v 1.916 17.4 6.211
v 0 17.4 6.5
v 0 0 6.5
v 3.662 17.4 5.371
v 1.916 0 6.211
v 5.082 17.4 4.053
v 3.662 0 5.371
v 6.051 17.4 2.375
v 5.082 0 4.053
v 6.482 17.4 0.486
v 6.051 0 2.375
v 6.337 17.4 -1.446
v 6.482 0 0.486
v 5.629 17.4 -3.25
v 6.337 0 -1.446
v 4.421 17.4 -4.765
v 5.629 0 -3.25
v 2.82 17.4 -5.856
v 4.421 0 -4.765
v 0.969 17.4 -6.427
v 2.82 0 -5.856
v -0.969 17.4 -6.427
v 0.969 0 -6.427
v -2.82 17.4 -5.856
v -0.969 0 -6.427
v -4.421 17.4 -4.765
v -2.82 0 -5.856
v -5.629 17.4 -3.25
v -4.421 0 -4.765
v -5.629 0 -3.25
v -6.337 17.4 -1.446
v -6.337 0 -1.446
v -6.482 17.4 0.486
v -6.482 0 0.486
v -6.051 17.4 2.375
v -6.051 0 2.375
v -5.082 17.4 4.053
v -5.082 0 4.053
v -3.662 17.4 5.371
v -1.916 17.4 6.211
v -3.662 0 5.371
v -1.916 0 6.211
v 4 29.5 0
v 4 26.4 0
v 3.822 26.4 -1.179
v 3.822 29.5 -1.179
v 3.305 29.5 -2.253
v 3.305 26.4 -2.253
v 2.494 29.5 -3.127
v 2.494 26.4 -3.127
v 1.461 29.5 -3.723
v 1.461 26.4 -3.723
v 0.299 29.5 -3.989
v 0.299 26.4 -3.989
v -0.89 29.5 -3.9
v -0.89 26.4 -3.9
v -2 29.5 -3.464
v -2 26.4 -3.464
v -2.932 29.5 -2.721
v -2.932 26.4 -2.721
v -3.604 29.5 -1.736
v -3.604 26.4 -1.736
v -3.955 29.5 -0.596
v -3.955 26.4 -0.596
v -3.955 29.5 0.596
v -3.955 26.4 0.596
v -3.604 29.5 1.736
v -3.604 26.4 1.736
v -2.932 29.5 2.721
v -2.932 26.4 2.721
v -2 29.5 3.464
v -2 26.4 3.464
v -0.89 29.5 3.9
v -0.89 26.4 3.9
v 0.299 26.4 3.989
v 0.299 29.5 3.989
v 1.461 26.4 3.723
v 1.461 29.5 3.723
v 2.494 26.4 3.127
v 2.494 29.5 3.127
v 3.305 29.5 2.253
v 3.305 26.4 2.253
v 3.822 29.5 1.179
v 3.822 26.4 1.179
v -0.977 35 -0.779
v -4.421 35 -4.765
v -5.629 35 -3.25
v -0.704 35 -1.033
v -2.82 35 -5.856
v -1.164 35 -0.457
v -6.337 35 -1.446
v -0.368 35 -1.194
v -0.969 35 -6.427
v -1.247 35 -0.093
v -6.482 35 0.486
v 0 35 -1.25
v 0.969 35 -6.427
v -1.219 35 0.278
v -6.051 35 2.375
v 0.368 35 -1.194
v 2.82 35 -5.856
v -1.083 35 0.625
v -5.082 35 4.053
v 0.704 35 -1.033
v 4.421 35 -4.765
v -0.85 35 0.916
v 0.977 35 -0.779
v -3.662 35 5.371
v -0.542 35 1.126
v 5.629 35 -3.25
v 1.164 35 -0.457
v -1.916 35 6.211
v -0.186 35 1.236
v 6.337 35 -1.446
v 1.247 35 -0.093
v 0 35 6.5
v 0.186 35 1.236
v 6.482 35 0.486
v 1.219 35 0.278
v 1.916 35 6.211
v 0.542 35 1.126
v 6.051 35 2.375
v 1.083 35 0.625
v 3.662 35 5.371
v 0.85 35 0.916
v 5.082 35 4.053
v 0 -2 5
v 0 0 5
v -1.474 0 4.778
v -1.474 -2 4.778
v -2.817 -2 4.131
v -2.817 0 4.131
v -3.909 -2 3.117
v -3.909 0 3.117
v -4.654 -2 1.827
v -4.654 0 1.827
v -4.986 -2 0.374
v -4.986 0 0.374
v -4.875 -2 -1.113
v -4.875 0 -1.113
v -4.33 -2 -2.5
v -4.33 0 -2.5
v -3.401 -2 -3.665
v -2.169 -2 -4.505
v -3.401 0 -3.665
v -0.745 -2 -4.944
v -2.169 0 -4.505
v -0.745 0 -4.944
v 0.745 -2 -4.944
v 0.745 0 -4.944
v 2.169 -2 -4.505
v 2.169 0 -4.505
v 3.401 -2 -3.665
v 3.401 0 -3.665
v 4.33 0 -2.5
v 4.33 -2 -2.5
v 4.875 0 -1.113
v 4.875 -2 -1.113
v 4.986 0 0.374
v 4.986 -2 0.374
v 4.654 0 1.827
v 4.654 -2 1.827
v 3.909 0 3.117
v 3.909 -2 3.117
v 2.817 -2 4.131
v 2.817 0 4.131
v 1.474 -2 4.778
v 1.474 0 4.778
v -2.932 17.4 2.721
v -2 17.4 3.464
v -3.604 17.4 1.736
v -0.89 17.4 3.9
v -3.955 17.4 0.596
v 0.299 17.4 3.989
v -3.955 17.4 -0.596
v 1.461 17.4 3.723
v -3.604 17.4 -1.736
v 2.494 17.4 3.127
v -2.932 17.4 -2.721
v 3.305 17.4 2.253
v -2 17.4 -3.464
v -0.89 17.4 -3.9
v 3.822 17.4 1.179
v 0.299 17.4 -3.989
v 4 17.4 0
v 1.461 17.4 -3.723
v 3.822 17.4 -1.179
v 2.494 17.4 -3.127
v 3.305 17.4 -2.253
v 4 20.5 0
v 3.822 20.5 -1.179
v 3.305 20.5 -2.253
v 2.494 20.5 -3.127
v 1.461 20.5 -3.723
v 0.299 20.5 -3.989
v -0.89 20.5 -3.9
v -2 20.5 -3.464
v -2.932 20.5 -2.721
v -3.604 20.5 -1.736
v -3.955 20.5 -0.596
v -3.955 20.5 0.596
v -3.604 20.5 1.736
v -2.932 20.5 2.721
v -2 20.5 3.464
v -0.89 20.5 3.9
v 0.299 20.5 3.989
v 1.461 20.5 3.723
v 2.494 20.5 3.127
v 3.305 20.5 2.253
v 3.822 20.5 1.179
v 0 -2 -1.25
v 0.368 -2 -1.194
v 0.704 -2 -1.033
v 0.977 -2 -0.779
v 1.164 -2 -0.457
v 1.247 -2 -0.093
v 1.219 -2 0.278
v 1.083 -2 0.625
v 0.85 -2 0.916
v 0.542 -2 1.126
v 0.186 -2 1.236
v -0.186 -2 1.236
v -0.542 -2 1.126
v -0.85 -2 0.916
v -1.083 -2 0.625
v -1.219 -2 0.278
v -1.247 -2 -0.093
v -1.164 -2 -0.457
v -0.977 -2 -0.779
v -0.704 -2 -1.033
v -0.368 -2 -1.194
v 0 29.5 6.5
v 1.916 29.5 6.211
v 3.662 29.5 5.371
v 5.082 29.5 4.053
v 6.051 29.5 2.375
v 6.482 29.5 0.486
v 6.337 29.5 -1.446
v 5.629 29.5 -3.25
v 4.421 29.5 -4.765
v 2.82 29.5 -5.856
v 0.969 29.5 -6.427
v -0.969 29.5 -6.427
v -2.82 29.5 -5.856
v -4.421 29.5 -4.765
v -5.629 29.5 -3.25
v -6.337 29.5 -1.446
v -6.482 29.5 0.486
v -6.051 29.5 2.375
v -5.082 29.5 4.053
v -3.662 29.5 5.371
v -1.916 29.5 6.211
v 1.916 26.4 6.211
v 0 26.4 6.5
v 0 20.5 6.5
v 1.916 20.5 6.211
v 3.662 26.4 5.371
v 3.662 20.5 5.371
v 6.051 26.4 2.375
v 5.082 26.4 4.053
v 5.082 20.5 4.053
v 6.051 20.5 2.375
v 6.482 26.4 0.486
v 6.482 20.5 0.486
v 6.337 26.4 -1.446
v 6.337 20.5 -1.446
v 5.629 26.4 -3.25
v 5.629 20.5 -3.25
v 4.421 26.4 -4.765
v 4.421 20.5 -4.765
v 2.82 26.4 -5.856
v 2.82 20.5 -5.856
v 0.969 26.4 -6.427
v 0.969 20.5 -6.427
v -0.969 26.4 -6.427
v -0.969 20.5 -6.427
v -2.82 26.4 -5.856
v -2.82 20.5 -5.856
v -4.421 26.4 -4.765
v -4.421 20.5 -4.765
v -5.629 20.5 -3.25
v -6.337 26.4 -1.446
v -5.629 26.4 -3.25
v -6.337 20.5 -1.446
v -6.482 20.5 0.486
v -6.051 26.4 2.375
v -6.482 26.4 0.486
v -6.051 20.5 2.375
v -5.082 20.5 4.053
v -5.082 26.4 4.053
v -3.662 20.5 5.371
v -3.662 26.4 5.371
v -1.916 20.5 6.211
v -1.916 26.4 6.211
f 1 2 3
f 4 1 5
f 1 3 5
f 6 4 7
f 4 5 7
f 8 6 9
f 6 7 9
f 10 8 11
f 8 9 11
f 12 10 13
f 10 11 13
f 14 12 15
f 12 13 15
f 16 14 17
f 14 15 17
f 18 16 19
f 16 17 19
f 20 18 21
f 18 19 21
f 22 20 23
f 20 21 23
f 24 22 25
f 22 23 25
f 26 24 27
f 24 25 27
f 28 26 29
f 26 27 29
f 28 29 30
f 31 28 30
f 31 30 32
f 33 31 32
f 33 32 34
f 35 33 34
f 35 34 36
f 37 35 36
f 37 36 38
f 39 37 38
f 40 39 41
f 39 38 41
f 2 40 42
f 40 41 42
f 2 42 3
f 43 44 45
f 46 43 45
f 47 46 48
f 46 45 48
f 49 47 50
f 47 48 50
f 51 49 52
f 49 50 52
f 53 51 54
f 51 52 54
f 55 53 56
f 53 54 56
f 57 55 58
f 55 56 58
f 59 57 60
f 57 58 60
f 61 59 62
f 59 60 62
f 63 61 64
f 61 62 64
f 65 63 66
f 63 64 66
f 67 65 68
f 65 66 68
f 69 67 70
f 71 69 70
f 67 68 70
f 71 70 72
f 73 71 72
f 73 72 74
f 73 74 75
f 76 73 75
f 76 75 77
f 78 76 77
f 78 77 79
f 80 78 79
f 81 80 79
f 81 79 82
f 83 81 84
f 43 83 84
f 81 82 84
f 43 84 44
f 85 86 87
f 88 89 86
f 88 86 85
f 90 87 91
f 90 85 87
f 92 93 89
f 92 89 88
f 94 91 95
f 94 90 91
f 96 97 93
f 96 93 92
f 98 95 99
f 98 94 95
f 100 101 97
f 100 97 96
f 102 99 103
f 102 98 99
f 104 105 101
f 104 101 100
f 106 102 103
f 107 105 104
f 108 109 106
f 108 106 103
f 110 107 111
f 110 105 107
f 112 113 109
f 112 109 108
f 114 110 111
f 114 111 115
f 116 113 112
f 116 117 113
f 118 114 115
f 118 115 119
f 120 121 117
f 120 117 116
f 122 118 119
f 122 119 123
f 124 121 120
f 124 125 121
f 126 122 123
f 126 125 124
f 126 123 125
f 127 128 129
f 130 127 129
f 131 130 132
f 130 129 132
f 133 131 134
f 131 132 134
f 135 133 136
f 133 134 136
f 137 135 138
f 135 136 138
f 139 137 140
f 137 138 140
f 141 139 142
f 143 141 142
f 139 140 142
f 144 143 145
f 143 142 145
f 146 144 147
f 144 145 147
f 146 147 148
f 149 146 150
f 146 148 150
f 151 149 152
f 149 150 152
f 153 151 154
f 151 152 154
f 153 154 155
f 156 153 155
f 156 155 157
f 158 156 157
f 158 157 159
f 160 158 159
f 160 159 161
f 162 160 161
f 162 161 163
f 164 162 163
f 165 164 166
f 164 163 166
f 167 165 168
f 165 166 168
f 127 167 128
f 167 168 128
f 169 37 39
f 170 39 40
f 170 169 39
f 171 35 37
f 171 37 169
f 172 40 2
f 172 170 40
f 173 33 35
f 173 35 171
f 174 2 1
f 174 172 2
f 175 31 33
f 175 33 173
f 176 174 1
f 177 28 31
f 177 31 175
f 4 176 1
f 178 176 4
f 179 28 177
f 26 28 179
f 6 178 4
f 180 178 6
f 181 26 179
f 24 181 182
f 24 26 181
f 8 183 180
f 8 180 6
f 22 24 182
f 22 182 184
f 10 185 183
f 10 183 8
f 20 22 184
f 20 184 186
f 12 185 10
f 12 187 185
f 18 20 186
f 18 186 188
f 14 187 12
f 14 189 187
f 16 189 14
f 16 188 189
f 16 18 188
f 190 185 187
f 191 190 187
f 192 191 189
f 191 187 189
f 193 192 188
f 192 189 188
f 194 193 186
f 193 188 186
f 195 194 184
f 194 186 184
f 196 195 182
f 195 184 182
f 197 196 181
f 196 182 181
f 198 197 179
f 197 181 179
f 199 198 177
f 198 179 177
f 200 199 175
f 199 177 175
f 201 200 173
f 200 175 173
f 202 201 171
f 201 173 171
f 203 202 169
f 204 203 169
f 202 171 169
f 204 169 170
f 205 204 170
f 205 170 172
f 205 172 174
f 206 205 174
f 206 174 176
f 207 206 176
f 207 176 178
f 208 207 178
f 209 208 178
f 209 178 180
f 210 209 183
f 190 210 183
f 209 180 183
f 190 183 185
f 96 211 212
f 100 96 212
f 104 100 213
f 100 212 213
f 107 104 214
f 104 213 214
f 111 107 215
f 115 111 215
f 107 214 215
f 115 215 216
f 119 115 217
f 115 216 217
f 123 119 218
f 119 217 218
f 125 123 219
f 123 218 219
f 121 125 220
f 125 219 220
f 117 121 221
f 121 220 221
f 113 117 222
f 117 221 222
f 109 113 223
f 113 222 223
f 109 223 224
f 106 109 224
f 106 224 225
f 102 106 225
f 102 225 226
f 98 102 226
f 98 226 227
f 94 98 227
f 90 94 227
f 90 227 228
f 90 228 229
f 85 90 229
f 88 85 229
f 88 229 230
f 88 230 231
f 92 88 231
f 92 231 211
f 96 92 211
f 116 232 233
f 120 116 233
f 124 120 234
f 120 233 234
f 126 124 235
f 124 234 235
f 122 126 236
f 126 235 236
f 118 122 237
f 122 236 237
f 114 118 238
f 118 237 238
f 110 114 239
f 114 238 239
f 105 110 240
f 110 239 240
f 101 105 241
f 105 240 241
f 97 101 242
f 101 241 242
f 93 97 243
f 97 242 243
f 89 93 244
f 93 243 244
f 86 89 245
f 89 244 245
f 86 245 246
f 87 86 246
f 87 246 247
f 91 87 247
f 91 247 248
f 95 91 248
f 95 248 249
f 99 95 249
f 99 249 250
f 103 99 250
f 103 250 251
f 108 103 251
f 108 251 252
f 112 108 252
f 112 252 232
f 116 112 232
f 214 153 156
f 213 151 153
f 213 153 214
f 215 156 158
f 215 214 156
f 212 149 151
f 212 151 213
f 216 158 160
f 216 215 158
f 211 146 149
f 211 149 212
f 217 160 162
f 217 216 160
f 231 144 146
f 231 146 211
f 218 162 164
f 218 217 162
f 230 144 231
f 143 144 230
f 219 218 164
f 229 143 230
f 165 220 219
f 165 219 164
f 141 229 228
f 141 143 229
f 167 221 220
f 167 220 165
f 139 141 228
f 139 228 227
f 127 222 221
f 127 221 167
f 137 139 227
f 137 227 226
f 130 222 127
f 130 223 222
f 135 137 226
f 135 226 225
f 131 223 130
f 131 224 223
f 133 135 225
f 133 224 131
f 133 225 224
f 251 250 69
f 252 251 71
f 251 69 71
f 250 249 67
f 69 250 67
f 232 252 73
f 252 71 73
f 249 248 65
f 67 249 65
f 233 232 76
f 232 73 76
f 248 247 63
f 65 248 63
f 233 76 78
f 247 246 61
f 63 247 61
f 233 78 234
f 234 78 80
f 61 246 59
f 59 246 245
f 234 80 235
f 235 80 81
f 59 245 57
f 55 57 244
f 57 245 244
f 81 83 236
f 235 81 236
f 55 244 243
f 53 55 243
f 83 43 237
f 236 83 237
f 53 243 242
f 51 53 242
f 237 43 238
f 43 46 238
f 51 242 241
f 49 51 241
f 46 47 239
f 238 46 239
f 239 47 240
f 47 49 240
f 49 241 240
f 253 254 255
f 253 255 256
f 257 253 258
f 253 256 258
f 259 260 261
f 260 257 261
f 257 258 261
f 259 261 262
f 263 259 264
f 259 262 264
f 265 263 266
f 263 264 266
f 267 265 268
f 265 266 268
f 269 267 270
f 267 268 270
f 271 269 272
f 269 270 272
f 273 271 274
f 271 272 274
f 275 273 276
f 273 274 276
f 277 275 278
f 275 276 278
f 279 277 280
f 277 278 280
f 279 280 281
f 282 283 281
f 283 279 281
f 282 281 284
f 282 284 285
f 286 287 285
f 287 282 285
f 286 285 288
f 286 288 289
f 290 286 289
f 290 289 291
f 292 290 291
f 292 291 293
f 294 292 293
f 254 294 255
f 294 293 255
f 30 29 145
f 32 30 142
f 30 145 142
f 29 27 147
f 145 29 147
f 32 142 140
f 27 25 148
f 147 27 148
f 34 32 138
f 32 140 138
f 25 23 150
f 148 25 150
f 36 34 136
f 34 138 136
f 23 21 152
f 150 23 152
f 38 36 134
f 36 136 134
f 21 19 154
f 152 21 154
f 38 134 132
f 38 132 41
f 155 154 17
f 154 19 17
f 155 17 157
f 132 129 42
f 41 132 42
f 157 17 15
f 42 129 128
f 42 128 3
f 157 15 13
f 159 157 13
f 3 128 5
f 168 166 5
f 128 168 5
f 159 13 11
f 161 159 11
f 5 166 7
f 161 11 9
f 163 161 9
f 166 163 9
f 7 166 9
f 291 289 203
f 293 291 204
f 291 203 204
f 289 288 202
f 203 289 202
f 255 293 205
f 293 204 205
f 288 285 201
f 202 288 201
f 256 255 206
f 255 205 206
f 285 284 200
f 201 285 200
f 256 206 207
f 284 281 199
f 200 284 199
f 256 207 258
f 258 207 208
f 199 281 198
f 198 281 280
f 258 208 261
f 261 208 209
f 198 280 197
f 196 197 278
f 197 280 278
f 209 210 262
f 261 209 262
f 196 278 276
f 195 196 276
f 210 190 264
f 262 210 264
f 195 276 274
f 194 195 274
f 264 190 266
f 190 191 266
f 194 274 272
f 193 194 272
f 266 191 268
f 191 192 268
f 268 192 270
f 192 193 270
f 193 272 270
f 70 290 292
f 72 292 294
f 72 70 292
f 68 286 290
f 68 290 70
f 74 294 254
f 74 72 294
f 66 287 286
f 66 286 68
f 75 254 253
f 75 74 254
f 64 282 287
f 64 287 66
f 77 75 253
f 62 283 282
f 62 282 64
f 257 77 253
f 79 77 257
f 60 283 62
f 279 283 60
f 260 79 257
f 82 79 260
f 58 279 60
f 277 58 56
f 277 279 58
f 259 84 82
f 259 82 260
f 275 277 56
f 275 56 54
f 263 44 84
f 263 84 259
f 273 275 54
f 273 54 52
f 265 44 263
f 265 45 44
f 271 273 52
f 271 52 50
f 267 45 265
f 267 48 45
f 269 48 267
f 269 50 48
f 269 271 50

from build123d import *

# Parameters (mm, degrees)
SCHIZZO1_R                     = 6.5
ESTRUSIONE_ESTRUSIONE1_DEPTH   = 35
SCHIZZO6_R                     = 1.25
TAGLIO_ESTRUSIONE4_DEPTH       = 37.187014245
TAGLIO_ESTRUSIONE5_START       = 17.4
TAGLIO_ESTRUSIONE5_OUTLINE_R   = 6.5
TAGLIO_ESTRUSIONE5_OUTLINE_R_2 = 4
TAGLIO_ESTRUSIONE5_DEPTH       = 3.1
RIPETIZIONE_A_L1_COUNT         = 2
RIPETIZIONE_A_L1_PITCH         = 9
SCHIZZO8_R                     = 5
ESTRUSIONE_ESTRUSIONE2_DEPTH   = 2
SCHIZZO9_R                     = 1.25
TAGLIO_ESTRUSIONE6_DEPTH       = 39.124795081


# Read off the part's stored shape, not the designer's step: Taglio-Estrusione5
with BuildPart() as part:
    # Schizzo1 → Estrusione-Estrusione1 (new body)
    with BuildSketch(Plane(origin=(0, 0, 0), x_dir=(1, 0, 0), z_dir=(0, 1, 0))):
        with Locations(Location((0, 0, 0), (0, 0, 270))):
            Circle(SCHIZZO1_R)
    extrude(amount=ESTRUSIONE_ESTRUSIONE1_DEPTH)

    # Schizzo6 → Taglio-Estrusione4 (cut, through all)
    with BuildSketch(Plane.XZ):
        with Locations(Location((0, 0, 0), (0, 0, 270))):
            Circle(SCHIZZO6_R)
    extrude(amount=-TAGLIO_ESTRUSIONE4_DEPTH, mode=Mode.SUBTRACT)

    # Taglio-Estrusione5 outline → Taglio-Estrusione5 (cut)
    with BuildSketch(Plane(origin=(0, 0, 0), x_dir=(1, 0, 0), z_dir=(0, 1, 0)).offset(TAGLIO_ESTRUSIONE5_START)):
        Circle(TAGLIO_ESTRUSIONE5_OUTLINE_R)
        Circle(TAGLIO_ESTRUSIONE5_OUTLINE_R_2, mode=Mode.SUBTRACT)
    taglio_estrusione5 = extrude(amount=TAGLIO_ESTRUSIONE5_DEPTH, mode=Mode.SUBTRACT)

    # Ripetizione a L1: Taglio-Estrusione5 ×2
    with Locations(*[(0, i * RIPETIZIONE_A_L1_PITCH, 0) for i in range(1, RIPETIZIONE_A_L1_COUNT)]):
        add(taglio_estrusione5, mode=Mode.SUBTRACT)

    # Schizzo8 → Estrusione-Estrusione2 (add)
    with BuildSketch(Plane.XZ):
        with Locations(Location((0, 0, 0), (0, 0, 90))):
            Circle(SCHIZZO8_R)
    extrude(amount=ESTRUSIONE_ESTRUSIONE2_DEPTH)

    # Schizzo9 → Taglio-Estrusione6 (cut, through all)
    with BuildSketch(Plane.XZ.offset(2)):
        with Locations(Location((0, 0, 0), (0, 0, 270))):
            Circle(SCHIZZO9_R)
    extrude(amount=-TAGLIO_ESTRUSIONE6_DEPTH, mode=Mode.SUBTRACT)


solid = part.part
